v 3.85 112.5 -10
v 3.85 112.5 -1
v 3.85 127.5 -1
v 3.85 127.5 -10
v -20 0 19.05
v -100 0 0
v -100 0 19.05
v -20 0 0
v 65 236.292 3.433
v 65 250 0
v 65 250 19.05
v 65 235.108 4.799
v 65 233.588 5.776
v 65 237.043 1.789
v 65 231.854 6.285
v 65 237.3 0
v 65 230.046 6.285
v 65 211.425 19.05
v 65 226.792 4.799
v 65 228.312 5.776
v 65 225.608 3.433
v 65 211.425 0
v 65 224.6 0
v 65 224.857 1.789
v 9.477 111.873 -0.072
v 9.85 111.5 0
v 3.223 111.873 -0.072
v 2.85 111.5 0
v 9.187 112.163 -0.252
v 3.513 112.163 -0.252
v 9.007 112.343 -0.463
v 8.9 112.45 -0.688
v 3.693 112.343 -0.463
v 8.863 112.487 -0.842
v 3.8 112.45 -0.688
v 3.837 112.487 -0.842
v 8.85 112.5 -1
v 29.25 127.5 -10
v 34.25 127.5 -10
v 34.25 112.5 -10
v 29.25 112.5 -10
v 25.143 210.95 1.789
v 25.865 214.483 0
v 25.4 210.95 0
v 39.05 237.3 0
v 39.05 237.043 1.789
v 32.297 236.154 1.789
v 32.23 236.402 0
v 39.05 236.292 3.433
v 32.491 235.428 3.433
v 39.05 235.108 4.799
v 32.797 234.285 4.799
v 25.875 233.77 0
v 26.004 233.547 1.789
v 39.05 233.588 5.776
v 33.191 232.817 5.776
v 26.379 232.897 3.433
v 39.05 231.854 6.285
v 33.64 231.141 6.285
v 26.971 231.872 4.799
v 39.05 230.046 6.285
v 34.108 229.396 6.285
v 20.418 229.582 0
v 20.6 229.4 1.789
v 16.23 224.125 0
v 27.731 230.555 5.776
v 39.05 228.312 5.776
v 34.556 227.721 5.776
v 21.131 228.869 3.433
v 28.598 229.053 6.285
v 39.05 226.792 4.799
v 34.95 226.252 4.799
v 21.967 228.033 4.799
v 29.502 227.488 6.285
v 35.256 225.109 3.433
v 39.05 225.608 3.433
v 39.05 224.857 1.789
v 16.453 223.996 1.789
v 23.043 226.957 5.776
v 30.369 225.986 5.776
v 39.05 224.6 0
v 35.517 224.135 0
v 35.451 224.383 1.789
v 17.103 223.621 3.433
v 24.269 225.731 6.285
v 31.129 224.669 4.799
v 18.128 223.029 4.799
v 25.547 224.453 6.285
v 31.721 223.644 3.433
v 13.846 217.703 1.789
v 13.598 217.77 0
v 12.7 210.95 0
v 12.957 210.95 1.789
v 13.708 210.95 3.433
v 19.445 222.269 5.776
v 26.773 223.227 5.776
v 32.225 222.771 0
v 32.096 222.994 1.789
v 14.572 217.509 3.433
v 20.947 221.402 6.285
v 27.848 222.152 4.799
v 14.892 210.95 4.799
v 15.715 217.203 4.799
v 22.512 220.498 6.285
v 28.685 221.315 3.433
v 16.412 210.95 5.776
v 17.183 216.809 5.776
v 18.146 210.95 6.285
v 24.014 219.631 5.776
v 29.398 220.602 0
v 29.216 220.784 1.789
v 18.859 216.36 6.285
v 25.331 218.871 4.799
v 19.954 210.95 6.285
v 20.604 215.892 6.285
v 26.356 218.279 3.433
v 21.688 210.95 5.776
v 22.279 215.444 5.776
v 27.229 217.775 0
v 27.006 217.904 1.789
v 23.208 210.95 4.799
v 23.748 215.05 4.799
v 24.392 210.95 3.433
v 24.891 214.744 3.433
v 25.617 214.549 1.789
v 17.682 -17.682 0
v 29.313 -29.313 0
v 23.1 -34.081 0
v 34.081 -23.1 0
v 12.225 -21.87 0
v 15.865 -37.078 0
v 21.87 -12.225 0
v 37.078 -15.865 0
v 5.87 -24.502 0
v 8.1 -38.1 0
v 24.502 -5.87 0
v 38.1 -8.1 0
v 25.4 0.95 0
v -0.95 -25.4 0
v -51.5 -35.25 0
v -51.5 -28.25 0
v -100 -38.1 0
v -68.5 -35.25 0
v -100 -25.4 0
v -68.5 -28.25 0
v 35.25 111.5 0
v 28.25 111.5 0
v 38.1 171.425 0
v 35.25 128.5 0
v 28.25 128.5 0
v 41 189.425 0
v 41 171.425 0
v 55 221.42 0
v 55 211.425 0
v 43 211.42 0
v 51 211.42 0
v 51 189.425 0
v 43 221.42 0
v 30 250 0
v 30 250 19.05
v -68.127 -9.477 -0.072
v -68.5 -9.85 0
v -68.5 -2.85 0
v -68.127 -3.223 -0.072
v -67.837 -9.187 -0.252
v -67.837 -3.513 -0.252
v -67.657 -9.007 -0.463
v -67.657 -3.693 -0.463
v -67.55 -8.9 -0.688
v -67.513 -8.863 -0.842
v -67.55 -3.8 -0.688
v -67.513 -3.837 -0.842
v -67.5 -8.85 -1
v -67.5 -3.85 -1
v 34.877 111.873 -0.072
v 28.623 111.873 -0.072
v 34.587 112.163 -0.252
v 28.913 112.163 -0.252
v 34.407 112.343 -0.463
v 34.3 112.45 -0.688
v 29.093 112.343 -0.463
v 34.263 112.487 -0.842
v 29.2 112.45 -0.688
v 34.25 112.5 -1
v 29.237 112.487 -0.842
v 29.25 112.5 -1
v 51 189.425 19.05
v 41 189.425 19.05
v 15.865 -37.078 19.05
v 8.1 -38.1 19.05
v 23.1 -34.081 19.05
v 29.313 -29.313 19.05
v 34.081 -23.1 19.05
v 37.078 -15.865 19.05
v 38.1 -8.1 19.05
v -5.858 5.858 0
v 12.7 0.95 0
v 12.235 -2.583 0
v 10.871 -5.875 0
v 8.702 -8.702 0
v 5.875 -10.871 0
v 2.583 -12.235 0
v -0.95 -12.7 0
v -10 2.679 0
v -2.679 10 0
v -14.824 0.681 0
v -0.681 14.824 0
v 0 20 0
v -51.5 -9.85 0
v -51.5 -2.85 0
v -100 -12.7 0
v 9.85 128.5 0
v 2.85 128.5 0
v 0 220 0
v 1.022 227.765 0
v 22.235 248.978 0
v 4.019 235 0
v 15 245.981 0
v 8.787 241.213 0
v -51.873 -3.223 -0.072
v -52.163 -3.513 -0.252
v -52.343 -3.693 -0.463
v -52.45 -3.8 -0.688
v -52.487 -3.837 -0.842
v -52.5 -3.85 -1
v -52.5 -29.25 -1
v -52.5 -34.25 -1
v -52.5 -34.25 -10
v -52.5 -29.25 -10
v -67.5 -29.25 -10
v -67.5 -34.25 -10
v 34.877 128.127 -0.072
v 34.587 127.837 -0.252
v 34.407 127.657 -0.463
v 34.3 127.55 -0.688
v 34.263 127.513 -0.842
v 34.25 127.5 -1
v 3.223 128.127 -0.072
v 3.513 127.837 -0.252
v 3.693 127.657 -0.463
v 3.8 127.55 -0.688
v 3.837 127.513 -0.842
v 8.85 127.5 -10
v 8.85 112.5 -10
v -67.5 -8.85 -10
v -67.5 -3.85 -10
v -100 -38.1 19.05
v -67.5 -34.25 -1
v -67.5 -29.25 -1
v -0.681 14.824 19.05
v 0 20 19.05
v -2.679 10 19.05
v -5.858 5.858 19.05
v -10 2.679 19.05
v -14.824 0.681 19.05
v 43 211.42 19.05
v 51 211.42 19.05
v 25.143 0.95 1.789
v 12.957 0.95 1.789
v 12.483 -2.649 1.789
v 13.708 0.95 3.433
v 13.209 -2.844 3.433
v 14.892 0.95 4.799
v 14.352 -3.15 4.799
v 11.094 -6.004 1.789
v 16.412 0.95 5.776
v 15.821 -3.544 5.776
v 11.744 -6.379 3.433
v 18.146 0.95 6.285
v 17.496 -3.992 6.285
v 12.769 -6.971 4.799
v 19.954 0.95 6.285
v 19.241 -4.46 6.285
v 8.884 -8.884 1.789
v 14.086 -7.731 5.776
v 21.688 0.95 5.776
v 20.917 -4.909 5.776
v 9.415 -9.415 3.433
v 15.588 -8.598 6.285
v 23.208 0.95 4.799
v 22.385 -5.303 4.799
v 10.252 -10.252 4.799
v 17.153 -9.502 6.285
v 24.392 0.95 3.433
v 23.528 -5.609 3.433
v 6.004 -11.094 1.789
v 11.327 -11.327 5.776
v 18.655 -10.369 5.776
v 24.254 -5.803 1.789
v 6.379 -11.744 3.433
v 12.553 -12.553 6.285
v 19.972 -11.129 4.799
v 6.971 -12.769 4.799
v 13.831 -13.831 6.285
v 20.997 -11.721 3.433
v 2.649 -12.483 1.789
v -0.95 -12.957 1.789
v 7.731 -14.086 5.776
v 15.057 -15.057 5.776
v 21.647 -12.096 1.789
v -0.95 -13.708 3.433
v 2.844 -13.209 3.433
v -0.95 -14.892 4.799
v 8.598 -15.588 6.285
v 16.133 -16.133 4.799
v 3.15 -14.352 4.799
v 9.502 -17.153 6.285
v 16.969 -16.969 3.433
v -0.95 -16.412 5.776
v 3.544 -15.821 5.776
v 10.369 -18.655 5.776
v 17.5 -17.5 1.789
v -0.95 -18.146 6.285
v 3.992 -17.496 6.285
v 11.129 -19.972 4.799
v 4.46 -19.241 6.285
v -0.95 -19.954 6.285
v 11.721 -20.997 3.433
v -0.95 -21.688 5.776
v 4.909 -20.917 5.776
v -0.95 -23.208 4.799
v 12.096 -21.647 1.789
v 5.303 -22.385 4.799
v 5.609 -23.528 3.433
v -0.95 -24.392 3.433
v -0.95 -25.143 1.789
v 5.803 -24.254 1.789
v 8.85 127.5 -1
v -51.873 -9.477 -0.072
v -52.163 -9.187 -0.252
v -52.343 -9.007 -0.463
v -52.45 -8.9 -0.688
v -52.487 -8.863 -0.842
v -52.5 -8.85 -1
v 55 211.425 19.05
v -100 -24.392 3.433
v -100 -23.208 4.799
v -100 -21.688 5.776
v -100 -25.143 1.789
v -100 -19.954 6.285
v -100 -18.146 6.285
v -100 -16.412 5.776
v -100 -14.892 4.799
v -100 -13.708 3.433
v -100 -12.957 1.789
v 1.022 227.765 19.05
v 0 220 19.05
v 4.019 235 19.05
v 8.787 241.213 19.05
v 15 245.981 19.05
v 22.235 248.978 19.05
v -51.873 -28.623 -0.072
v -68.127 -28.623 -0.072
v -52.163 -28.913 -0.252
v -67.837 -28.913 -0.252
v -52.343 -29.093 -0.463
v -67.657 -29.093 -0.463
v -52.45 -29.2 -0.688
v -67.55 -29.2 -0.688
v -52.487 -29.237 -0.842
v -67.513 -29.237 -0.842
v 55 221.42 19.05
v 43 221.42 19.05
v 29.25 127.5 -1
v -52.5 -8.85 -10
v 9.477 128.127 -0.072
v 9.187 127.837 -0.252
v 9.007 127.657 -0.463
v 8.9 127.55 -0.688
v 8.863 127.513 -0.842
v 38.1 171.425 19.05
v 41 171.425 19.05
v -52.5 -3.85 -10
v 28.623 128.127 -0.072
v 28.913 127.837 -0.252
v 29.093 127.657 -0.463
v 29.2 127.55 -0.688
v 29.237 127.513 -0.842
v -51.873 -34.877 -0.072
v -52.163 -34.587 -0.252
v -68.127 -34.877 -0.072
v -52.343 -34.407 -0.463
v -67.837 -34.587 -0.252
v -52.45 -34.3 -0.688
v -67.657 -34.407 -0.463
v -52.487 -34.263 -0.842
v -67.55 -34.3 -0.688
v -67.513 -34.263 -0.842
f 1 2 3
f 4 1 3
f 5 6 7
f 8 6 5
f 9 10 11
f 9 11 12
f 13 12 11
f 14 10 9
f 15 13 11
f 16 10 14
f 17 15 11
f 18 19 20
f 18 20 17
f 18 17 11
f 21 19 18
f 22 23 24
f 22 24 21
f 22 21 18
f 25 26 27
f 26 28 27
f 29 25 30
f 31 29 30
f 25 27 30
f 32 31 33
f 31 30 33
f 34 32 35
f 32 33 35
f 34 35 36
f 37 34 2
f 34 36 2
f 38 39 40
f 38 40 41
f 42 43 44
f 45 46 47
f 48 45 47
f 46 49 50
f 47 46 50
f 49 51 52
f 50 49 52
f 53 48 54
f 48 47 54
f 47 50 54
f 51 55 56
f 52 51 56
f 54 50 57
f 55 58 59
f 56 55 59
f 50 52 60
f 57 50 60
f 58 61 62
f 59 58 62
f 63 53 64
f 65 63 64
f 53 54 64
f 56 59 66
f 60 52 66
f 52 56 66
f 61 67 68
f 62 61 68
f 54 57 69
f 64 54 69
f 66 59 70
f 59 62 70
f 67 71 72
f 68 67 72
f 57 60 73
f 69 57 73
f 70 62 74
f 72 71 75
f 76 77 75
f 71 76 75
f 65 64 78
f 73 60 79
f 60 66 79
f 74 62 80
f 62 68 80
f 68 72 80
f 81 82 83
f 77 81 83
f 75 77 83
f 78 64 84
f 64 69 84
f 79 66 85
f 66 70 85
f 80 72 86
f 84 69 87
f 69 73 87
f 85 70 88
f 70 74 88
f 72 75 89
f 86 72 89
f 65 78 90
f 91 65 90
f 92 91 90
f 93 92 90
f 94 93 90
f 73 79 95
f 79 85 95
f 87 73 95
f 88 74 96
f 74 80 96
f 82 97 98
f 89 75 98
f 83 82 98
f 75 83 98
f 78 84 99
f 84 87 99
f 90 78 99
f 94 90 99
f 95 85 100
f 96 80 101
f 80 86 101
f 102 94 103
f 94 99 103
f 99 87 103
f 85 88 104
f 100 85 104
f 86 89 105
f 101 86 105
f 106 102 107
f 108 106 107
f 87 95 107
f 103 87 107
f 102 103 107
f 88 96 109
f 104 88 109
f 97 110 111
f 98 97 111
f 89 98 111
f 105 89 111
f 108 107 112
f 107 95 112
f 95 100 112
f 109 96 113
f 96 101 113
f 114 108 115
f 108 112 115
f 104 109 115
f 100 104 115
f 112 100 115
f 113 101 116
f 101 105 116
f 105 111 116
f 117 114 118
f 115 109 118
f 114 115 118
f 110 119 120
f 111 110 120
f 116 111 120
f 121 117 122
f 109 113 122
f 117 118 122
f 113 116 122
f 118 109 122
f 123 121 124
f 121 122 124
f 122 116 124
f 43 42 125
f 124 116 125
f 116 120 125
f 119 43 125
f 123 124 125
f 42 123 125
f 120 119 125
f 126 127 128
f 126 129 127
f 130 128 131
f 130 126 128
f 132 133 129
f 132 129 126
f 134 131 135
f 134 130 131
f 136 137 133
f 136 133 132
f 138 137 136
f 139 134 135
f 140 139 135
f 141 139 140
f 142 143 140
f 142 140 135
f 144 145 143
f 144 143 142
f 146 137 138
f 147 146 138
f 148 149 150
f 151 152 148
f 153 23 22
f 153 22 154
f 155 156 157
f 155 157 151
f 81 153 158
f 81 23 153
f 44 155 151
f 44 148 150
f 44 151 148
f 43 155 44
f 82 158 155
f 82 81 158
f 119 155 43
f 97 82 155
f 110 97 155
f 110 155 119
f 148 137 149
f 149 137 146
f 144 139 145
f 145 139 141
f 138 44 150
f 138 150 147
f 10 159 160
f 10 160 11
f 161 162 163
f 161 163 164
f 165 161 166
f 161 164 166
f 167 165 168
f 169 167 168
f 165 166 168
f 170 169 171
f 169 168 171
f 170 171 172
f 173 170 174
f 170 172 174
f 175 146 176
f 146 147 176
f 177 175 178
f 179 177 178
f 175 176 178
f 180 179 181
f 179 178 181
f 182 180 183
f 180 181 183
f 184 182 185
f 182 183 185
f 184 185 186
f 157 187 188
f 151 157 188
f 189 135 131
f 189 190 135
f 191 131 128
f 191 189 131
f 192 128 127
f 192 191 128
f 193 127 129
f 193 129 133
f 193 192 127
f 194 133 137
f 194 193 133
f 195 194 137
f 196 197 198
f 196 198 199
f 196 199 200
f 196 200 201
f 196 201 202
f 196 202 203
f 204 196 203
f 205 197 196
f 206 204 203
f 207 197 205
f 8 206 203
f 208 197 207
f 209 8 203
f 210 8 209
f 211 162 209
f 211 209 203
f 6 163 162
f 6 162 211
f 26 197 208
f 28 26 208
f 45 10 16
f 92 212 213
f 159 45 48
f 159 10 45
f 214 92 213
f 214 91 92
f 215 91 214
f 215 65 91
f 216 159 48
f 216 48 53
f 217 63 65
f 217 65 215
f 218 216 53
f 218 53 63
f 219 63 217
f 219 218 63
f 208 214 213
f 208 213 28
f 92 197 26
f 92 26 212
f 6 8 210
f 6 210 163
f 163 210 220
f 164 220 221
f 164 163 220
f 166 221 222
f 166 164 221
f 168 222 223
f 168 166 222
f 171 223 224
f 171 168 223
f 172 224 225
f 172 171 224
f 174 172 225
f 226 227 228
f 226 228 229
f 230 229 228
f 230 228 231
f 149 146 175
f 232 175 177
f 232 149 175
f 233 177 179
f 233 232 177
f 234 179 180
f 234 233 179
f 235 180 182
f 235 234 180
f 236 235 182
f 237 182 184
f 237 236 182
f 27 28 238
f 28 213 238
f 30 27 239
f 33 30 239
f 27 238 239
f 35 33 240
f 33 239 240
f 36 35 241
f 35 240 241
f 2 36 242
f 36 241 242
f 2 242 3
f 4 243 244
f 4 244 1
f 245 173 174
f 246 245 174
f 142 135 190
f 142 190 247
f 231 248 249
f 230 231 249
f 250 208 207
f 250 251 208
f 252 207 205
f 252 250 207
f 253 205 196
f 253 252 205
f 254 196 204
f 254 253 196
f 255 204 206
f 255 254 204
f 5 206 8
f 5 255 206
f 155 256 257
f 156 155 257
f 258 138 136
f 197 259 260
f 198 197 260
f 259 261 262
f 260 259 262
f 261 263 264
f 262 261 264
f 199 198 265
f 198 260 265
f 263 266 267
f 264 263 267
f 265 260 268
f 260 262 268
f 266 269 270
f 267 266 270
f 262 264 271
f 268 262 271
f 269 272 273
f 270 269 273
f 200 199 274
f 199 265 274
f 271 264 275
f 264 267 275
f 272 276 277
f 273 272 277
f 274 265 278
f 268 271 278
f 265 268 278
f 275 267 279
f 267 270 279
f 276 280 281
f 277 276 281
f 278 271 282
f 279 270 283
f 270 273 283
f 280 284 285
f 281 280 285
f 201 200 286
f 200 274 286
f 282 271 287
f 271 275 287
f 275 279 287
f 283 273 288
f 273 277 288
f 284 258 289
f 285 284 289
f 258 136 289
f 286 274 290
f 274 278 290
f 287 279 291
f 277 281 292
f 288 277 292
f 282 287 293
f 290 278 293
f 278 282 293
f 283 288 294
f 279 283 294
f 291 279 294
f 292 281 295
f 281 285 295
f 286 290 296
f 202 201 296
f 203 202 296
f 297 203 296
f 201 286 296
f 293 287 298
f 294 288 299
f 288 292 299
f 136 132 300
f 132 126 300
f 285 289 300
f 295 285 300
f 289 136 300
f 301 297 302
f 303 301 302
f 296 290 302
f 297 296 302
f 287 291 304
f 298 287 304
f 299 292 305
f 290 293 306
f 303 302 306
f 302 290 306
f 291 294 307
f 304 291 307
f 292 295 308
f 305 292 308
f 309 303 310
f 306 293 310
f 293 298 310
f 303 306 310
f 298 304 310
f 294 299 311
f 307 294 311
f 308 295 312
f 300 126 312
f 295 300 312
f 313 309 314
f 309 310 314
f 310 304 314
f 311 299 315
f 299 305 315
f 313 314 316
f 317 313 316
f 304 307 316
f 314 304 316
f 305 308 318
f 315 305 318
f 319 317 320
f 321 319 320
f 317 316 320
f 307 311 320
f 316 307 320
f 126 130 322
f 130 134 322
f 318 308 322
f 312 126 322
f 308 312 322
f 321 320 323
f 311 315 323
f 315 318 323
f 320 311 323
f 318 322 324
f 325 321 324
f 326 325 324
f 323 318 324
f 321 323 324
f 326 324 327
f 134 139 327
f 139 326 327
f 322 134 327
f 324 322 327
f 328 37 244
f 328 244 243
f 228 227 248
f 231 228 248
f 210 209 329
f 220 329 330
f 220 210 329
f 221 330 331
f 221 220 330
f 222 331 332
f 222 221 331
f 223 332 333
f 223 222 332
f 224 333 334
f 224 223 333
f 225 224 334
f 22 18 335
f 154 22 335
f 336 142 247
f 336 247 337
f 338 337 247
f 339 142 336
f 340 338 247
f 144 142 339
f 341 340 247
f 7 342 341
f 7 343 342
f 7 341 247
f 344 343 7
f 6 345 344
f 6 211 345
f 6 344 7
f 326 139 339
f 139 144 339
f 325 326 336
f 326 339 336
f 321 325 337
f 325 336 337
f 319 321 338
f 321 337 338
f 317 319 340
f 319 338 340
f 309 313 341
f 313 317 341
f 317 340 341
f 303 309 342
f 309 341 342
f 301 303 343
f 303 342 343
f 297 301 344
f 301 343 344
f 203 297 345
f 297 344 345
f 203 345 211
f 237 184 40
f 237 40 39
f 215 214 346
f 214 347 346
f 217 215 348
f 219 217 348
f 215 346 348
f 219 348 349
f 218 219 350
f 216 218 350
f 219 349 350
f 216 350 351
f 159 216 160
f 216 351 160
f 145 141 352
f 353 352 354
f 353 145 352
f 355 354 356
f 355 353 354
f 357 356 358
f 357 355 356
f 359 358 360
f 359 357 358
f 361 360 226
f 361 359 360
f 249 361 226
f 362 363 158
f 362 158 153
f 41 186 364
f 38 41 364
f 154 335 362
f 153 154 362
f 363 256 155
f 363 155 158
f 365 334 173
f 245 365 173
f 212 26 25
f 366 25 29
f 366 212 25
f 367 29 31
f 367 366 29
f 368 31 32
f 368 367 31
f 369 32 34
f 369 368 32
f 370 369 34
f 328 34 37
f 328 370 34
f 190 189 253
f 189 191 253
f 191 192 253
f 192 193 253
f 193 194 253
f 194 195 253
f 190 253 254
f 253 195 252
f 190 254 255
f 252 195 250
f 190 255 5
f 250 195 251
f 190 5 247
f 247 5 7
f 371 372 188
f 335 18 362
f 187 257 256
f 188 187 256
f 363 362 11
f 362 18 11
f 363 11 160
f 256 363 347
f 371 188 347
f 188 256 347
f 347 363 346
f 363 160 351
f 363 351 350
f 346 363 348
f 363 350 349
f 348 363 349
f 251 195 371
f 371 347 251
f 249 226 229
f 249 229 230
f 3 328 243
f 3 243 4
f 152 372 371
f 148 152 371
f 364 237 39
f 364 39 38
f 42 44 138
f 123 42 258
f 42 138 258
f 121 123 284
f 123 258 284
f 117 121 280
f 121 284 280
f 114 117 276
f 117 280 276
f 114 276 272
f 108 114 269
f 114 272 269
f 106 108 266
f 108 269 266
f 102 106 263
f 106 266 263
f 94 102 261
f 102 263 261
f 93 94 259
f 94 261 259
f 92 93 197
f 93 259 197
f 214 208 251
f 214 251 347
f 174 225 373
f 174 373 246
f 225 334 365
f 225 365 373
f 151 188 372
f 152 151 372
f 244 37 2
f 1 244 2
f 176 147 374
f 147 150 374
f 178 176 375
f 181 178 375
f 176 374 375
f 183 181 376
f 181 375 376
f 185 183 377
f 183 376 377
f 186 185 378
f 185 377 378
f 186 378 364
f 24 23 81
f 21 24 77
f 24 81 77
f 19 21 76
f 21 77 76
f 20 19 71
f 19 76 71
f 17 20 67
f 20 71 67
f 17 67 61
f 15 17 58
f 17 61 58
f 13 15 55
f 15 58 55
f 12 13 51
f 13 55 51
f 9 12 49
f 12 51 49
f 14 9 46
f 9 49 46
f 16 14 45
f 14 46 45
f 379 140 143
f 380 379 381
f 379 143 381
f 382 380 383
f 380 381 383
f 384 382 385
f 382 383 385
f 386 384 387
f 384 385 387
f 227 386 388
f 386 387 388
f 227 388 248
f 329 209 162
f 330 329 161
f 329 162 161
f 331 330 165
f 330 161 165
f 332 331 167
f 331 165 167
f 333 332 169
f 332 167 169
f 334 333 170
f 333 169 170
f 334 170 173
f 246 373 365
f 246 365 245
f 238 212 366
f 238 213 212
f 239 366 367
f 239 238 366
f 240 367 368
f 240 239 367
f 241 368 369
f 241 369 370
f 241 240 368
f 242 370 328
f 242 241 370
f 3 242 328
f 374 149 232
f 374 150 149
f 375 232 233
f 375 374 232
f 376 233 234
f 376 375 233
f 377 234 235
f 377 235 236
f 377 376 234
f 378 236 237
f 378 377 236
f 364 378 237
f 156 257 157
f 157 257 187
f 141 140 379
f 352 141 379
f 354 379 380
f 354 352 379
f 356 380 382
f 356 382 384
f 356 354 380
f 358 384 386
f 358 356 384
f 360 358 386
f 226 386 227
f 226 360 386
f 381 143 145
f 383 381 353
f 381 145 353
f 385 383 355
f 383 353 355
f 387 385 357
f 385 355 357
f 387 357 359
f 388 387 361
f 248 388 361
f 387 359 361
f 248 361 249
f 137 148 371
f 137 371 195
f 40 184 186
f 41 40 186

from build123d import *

# Parameters (mm, degrees)
BOSS_EXTRUDE1_DEPTH  = 19.05
CUT_SWEEP1_PROFILE_R = 6.35
FILLET1_R            = 30
FILLET2_R            = 20
SKETCH10_W           = 5
SKETCH10_H           = 15
SKETCH10_W_2         = 15
SKETCH10_H_2         = 5
BOSS_EXTRUDE2_DEPTH  = 10
FILLET3_R            = 1
BOSS_EXTRUDE3_DEPTH  = 19.05
SKETCH14_W           = 12
SKETCH14_H           = 10
CUT_EXTRUDE1_DEPTH   = 39


with BuildPart() as part:
    # Sketch1 → Boss-Extrude1 (new body)
    with BuildSketch(Plane.XY):
        Polygon((-100, 0), (0, 0), (0, 250), (65, 250), (65, 211.9), (38.1, 211.9), (38.1, -38.1), (-100, -38.1), align=None)
    extrude(amount=BOSS_EXTRUDE1_DEPTH)

    # Cut-Sweep1: sweep along a path in Sketch2
    with BuildLine(Plane(origin=(0, 0, 0), x_dir=(-1, 0, 0), z_dir=(0, 0, -1))) as cut_sweep1_path:
        Line((-65, 230.95), (-39.05, 230.95))
        ThreePointArc((-39.05, 230.95), (-24.907864376, 225.092135624), (-19.05, 210.95))
        Line((-19.05, 210.95), (-19.05, 0.95))
        ThreePointArc((-19.05, 0.95), (-13.192135624, -13.192135624), (0.95, -19.05))
        Line((0.95, -19.05), (100, -19.05))
    # Cut-Sweep1 profile (on start of the path) → Cut-Sweep1 (sweep, cut)
    with BuildSketch(Plane(origin=(65, 230.95, 0), x_dir=(0, 0, -1), z_dir=(-1, 0, 0))):
        Circle(CUT_SWEEP1_PROFILE_R)
    sweep(path=cut_sweep1_path.line, mode=Mode.SUBTRACT)

    # Fillet1
    fillet1_edges = [part.edges().sort_by_distance(p)[0] for p in [
        (0, 250, 9.525),
        (38.1, -38.1, 9.525),
    ]]
    fillet(fillet1_edges, radius=FILLET1_R)

    # Fillet2
    fillet2_edges = [part.edges().sort_by_distance(p)[0] for p in [
        (0, 0, 9.525),
    ]]
    fillet(fillet2_edges, radius=FILLET2_R)

    # Sketch10 → Boss-Extrude2 (add)
    with BuildSketch(Plane(origin=(0, 0, 0), x_dir=(-1, 0, 0), z_dir=(0, 0, -1))):
        with Locations((-6.35, 120)):
            Rectangle(SKETCH10_W, SKETCH10_H)
        with Locations((-31.75, 120)):
            Rectangle(SKETCH10_W, SKETCH10_H)
        with Locations((60, -6.35)):
            Rectangle(SKETCH10_W_2, SKETCH10_H_2)
        with Locations((60, -31.75)):
            Rectangle(SKETCH10_W_2, SKETCH10_H_2)
    extrude(amount=BOSS_EXTRUDE2_DEPTH)

    # Fillet3
    fillet3_edges = [part.edges().sort_by_distance(p)[0] for p in [
        (-67.5, -31.75, 0),
        (-60, -29.25, 0),
        (-52.5, -31.75, 0),
        (-60, -34.25, 0),
        (8.85, 120, 0),
        (6.35, 112.5, 0),
        (3.85, 120, 0),
        (6.35, 127.5, 0),
        (-52.5, -6.35, 0),
        (-60, -8.85, 0),
        (-67.5, -6.35, 0),
        (-60, -3.85, 0),
        (34.25, 120, 0),
        (31.75, 112.5, 0),
        (29.25, 120, 0),
        (31.75, 127.5, 0),
    ]]
    fillet(fillet3_edges, radius=FILLET3_R)

    # Sketch13 → Boss-Extrude3 (add)
    with BuildSketch(Plane.XY.offset(19.05)):
        Polygon((55, 221.425), (43, 221.425), (43, 211.425), (51, 211.425), (51, 189.425), (41, 189.425), (41, 171.425), (36.549895251, 171.425), (36.549895251, 223.572995821), (65, 223.572995821), (65, 211.9), (65, 211.425), (55, 211.425), align=None)
    extrude(amount=-BOSS_EXTRUDE3_DEPTH)

    # Sketch14 → Cut-Extrude1 (cut)
    with BuildSketch(Plane.XY.offset(19.05)):
        with Locations((49, 216.42)):
            Rectangle(SKETCH14_W, SKETCH14_H)
    extrude(amount=-CUT_EXTRUDE1_DEPTH, mode=Mode.SUBTRACT)


solid = part.part
